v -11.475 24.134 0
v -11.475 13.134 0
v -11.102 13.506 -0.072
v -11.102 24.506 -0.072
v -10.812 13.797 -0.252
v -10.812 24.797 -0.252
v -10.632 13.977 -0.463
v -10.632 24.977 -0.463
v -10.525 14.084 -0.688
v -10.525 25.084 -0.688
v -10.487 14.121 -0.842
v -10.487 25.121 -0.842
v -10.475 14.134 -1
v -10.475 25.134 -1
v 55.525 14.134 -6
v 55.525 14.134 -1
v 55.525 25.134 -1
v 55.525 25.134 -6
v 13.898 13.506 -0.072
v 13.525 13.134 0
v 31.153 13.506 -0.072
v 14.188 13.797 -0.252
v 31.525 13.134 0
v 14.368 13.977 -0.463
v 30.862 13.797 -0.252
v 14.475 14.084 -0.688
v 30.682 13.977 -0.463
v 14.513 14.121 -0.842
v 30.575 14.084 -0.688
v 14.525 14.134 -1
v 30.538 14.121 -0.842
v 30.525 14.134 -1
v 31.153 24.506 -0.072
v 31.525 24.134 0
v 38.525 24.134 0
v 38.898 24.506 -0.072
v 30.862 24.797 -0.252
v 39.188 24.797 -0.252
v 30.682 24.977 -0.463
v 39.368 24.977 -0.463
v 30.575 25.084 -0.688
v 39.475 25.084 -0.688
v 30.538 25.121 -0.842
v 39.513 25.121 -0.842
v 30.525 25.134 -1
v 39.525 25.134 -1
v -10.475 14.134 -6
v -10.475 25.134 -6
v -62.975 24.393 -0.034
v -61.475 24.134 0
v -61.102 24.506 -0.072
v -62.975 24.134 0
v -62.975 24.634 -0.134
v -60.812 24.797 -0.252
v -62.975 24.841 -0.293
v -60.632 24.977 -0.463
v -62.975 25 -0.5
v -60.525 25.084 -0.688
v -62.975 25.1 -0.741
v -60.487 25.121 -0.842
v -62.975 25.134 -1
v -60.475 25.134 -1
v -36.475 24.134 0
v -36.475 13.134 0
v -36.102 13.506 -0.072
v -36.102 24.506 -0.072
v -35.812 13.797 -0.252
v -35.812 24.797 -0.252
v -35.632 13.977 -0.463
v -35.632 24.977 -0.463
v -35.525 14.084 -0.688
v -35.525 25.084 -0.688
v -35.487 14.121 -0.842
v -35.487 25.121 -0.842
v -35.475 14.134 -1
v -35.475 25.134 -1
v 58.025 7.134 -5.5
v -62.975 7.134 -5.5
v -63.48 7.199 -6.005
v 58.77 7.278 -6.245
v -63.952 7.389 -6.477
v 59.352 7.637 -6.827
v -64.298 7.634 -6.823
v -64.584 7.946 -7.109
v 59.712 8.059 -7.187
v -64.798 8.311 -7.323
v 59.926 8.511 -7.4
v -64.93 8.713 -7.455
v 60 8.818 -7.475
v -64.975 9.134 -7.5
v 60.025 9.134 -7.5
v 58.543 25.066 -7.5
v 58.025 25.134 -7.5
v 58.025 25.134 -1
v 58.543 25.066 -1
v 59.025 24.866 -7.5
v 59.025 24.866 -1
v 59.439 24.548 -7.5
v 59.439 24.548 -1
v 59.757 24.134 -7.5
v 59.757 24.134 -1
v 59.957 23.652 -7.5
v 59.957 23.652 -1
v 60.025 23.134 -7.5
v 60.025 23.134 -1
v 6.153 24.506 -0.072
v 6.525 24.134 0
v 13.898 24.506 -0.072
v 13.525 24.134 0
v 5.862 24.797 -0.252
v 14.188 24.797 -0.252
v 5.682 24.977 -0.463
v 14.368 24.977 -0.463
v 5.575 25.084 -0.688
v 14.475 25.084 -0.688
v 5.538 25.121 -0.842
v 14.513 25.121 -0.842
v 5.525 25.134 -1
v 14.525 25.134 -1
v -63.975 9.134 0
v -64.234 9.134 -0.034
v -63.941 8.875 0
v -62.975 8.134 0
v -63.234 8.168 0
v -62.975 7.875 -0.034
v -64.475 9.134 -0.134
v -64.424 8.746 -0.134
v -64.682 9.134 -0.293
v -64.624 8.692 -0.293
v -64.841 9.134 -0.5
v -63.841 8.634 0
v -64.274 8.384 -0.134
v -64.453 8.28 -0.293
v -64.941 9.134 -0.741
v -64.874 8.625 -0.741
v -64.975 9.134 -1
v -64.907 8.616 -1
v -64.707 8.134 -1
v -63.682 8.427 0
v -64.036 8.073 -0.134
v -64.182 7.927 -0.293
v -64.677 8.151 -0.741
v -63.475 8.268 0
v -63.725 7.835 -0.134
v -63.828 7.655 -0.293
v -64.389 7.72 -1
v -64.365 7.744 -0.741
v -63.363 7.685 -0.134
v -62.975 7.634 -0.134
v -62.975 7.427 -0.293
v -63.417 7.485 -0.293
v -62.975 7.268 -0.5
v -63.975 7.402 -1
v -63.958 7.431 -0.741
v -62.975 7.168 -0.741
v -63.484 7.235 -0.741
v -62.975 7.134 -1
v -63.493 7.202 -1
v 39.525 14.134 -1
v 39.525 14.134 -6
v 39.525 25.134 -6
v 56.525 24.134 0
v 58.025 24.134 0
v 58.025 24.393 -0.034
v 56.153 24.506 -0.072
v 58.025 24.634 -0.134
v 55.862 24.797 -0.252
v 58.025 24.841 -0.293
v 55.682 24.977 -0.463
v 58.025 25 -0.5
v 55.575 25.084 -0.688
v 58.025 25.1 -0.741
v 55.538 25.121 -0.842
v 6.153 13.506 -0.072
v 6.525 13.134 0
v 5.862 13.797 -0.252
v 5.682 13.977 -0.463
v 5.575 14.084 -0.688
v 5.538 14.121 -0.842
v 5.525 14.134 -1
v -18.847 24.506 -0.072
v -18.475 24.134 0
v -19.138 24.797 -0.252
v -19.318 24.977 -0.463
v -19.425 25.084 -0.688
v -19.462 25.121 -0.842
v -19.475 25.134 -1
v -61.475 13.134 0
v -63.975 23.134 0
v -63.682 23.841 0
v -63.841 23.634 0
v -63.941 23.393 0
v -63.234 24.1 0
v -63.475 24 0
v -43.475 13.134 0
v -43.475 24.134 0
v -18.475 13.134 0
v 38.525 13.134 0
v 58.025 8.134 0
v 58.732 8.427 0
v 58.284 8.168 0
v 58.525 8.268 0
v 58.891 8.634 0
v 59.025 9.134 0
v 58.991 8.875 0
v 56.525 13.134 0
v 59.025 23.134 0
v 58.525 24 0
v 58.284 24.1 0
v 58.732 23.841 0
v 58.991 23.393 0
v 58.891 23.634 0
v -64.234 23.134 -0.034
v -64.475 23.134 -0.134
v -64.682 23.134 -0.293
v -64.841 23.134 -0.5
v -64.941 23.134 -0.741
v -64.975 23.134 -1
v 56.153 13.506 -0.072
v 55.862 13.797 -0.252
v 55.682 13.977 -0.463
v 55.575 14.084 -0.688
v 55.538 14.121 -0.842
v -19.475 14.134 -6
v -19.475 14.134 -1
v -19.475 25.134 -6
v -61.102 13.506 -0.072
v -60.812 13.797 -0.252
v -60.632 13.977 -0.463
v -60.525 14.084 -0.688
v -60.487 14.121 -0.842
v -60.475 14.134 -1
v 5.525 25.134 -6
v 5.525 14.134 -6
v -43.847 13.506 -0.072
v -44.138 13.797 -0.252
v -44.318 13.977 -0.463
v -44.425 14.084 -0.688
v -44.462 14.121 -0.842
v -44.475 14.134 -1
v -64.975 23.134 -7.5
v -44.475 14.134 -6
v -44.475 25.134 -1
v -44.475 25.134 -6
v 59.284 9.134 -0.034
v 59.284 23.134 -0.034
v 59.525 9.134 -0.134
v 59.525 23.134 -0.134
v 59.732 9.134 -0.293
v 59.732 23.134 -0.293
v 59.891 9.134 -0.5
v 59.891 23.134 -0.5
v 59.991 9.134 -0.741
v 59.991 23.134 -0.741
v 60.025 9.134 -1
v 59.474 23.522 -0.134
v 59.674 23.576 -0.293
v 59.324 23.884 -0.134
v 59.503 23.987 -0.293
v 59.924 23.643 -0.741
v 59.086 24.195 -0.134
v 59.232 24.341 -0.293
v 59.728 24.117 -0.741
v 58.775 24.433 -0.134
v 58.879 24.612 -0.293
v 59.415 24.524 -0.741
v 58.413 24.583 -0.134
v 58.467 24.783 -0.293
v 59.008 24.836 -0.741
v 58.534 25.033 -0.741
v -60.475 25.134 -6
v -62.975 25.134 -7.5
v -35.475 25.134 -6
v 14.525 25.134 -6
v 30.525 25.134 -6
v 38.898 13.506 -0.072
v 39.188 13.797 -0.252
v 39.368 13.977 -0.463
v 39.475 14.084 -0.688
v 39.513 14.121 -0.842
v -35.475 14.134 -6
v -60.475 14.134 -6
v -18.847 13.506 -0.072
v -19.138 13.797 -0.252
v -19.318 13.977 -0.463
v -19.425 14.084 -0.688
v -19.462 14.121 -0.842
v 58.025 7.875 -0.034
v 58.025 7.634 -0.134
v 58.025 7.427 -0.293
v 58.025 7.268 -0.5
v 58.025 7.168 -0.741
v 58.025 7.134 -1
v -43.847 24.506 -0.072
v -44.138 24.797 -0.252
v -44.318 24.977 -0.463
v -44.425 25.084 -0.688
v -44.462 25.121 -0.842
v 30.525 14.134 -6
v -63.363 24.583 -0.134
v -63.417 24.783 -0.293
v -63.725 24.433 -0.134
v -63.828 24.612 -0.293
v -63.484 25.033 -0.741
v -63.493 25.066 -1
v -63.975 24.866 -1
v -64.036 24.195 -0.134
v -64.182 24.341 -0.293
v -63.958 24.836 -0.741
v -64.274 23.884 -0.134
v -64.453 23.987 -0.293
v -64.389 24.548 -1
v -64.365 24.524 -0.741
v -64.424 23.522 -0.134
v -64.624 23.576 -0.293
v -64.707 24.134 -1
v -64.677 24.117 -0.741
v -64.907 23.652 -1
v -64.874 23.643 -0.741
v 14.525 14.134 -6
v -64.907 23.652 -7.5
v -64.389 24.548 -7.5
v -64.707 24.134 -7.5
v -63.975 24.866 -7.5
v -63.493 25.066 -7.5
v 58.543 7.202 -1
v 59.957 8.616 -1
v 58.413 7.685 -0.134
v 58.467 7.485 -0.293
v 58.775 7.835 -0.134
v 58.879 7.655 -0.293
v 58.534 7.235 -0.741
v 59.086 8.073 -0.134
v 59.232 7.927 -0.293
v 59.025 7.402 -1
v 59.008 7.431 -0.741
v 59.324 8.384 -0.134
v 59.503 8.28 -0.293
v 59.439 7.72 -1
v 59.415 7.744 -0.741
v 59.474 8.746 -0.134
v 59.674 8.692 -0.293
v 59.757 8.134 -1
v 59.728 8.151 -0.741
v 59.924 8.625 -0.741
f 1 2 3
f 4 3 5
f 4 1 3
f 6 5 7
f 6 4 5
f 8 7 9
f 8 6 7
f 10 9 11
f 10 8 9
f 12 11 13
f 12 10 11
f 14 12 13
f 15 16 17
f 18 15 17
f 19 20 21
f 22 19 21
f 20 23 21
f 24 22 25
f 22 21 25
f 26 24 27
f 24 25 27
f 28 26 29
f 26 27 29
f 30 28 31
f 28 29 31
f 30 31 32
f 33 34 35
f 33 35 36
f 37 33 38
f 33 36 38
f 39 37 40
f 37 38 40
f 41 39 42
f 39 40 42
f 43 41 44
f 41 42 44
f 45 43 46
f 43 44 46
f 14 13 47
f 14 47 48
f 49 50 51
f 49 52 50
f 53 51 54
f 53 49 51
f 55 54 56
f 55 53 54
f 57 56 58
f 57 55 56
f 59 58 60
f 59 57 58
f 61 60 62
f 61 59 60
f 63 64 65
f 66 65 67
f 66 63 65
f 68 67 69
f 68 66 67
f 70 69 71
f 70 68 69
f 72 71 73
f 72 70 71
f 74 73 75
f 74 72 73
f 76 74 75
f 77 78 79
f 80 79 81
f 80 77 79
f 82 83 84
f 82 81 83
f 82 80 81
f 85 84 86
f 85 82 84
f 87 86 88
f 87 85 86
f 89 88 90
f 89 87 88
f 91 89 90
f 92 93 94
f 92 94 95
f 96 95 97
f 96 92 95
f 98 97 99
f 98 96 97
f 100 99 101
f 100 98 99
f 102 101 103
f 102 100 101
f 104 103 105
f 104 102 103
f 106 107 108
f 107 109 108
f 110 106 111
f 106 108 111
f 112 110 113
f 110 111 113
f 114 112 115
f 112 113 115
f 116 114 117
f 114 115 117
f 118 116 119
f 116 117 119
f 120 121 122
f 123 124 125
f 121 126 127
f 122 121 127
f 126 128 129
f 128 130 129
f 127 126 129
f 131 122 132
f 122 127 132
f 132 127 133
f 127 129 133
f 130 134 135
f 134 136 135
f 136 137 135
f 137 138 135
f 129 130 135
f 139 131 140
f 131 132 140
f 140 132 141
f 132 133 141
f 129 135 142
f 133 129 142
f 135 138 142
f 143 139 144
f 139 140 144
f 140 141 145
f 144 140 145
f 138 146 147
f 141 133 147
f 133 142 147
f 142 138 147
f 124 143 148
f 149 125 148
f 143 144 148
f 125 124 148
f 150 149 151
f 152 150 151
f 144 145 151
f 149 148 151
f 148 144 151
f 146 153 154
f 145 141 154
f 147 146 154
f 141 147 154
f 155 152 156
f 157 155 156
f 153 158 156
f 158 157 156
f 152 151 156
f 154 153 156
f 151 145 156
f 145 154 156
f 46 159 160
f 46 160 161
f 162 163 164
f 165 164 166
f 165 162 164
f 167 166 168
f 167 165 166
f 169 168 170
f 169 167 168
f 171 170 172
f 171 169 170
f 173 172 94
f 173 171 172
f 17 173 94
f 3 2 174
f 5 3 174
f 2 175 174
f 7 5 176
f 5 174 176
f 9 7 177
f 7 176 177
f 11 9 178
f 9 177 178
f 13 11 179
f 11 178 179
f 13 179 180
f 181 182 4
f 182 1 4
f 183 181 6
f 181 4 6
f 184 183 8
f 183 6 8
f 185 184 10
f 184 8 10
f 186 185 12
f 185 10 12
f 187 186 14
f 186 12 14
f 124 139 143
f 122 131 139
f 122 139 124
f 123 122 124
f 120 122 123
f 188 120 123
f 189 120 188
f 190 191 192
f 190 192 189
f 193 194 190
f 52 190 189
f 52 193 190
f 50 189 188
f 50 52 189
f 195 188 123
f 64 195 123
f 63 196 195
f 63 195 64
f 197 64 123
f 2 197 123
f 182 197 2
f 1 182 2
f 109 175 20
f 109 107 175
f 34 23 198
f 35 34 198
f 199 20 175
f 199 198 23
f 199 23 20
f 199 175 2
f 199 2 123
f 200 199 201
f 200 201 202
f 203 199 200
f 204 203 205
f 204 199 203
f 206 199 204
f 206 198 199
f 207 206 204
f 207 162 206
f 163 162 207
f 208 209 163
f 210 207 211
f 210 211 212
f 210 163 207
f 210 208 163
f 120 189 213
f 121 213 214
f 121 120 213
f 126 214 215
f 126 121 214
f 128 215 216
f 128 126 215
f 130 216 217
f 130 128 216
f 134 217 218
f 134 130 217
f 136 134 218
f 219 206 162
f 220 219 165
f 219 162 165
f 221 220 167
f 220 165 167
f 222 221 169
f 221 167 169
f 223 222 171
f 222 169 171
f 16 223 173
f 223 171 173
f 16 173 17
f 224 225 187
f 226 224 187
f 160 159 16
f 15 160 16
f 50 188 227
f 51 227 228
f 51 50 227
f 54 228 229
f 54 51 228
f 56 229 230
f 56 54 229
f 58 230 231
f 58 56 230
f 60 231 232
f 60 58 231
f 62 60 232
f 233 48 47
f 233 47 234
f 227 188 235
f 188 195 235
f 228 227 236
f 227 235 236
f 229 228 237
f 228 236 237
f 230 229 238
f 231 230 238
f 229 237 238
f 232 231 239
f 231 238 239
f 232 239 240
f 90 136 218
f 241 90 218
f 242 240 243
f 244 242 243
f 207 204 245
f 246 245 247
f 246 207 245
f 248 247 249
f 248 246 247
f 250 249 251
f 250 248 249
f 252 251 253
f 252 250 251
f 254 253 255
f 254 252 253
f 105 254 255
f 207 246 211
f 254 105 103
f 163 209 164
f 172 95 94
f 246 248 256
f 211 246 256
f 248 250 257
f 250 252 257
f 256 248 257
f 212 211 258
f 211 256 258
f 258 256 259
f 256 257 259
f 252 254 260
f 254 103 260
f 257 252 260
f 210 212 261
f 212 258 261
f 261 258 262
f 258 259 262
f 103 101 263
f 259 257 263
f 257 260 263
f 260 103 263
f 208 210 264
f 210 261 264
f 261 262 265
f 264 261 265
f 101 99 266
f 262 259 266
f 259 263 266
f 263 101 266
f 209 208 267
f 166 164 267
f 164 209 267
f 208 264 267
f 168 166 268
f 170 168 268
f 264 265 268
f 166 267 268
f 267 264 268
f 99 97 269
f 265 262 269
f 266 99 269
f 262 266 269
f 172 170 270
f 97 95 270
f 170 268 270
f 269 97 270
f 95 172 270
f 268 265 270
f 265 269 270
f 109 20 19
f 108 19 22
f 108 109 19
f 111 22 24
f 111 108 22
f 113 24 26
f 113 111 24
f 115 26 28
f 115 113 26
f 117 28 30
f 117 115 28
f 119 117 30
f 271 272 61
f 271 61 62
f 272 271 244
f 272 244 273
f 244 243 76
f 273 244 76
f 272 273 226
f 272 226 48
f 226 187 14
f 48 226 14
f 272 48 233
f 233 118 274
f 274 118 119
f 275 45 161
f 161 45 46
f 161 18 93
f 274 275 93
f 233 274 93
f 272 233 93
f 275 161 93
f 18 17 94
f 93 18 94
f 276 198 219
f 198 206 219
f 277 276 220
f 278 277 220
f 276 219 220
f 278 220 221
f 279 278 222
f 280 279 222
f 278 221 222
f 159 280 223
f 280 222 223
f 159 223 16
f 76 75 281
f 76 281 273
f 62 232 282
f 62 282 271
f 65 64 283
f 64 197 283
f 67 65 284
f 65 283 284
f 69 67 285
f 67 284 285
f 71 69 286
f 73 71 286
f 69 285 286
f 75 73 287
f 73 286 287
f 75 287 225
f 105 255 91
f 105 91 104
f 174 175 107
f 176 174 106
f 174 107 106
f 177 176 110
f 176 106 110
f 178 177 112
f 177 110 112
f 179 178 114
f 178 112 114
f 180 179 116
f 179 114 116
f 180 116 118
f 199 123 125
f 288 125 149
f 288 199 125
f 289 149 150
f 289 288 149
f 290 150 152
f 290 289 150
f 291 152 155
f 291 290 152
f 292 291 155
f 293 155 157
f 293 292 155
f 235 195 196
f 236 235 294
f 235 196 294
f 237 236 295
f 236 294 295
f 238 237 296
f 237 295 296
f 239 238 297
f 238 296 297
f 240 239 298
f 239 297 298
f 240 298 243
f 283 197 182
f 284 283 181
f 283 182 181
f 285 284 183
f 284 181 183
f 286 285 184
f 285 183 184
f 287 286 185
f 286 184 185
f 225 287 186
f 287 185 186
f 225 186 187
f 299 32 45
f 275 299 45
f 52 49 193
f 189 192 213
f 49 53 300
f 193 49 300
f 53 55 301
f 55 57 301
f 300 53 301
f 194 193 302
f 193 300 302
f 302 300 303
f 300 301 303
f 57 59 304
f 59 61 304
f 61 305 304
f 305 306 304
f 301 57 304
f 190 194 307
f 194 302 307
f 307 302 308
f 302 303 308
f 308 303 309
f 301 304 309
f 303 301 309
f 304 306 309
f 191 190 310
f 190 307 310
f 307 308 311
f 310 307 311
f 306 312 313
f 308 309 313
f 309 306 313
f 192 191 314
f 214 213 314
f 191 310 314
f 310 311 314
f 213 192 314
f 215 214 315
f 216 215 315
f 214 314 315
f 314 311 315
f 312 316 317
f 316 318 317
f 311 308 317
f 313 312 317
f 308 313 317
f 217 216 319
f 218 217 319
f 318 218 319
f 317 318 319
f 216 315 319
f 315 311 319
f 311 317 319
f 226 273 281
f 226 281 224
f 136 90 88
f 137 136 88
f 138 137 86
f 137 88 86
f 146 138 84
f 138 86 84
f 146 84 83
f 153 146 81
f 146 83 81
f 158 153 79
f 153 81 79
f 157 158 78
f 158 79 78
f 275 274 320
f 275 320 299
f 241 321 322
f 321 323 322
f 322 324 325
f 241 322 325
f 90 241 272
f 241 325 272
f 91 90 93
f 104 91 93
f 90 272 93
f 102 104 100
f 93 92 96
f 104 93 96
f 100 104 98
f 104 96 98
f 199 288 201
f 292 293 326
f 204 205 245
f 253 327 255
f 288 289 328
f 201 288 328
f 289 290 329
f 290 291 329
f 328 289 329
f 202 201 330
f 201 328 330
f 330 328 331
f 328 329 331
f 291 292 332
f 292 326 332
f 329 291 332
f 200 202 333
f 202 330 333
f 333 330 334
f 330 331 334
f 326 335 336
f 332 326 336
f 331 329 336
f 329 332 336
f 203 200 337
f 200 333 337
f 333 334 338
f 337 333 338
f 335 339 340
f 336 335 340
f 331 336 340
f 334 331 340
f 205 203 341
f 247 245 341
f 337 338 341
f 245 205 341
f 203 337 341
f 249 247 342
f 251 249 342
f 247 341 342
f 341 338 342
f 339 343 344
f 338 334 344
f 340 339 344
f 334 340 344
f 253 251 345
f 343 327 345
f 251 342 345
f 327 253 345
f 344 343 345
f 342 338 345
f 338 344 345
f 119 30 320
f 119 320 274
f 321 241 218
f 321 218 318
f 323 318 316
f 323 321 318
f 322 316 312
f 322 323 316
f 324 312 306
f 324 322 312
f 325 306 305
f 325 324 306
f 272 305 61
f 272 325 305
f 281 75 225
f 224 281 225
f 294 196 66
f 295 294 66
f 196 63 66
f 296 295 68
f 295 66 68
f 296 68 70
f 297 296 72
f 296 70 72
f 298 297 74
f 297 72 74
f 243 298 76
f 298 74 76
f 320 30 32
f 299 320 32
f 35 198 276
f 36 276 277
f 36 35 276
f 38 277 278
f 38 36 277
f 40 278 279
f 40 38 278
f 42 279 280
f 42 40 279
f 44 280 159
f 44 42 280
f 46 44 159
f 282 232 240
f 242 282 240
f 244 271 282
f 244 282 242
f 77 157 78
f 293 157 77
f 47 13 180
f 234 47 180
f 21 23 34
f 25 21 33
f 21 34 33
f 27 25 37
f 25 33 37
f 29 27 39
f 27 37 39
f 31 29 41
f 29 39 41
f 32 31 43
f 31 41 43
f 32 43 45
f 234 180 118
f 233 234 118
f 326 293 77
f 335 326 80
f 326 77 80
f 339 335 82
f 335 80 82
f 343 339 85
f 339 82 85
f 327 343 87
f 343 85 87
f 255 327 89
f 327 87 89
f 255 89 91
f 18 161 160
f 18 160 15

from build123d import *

# Parameters (mm, degrees)
F0_W     = 125
F0_H     = 18
F1_DEPTH = 7.5
F2_W     = 16
F2_H     = 11
F3_DEPTH = 6
F4_R     = 2
F5_R     = 1


with BuildPart() as f1:
    # F0 (on Top) → F1 (new body)
    with BuildSketch(Plane.XY):
        with Locations((-2.4749040604, 16.1338936687)):
            Rectangle(F0_W, F0_H)
    extrude(amount=-F1_DEPTH)

    # F2 (on Top) → F3 (cut)
    with BuildSketch(Plane.XY):
        with Locations((-52.4749040604, 19.6338936687)):
            Rectangle(F2_W, F2_H)
        with Locations((-27.4749040604, 19.6338936687)):
            Rectangle(F2_W, F2_H)
        with Locations((-2.4749040604, 19.6338936687)):
            Rectangle(F2_W, F2_H)
        with Locations((22.5250959396, 19.6338936687)):
            Rectangle(F2_W, F2_H)
        with Locations((47.5250959396, 19.6338936687)):
            Rectangle(F2_W, F2_H)
    extrude(amount=-F3_DEPTH, mode=Mode.SUBTRACT)

    # F4
    f4_edges = [f1.edges().sort_by_distance(p)[0] for p in [
        (60.025096, 25.133894, -3.75),
        (60.025096, 7.133894, -3.75),
        (-64.974904, 25.133894, -3.75),
        (-64.974904, 7.133894, -3.75),
        (-2.474904, 7.133894, -7.5),
    ]]
    fillet(f4_edges, radius=F4_R)

    # F5
    f5_edges = [f1.edges().sort_by_distance(p)[0] for p in [
        (60.025096, 16.133894, 0),
        (59.43931, 7.71968, 0),
        (59.43931, 24.548107, 0),
        (-2.474904, 7.133894, 0),
        (56.775096, 25.133894, 0),
        (-64.389118, 7.71968, 0),
        (55.525096, 19.633894, 0),
        (-64.974904, 16.133894, 0),
        (47.525096, 14.133894, 0),
        (-64.389118, 24.548107, 0),
        (39.525096, 19.633894, 0),
        (-61.724904, 25.133894, 0),
        (35.025096, 25.133894, 0),
        (-60.474904, 19.633894, 0),
        (30.525096, 19.633894, 0),
        (-52.474904, 14.133894, 0),
        (22.525096, 14.133894, 0),
        (-44.474904, 19.633894, 0),
        (14.525096, 19.633894, 0),
        (-39.974904, 25.133894, 0),
        (10.025096, 25.133894, 0),
        (-35.474904, 19.633894, 0),
        (5.525096, 19.633894, 0),
        (-27.474904, 14.133894, 0),
        (-2.474904, 14.133894, 0),
        (-19.474904, 19.633894, 0),
        (-10.474904, 19.633894, 0),
        (-14.974904, 25.133894, 0),
    ]]
    fillet(f5_edges, radius=F5_R)


solid = f1.part
